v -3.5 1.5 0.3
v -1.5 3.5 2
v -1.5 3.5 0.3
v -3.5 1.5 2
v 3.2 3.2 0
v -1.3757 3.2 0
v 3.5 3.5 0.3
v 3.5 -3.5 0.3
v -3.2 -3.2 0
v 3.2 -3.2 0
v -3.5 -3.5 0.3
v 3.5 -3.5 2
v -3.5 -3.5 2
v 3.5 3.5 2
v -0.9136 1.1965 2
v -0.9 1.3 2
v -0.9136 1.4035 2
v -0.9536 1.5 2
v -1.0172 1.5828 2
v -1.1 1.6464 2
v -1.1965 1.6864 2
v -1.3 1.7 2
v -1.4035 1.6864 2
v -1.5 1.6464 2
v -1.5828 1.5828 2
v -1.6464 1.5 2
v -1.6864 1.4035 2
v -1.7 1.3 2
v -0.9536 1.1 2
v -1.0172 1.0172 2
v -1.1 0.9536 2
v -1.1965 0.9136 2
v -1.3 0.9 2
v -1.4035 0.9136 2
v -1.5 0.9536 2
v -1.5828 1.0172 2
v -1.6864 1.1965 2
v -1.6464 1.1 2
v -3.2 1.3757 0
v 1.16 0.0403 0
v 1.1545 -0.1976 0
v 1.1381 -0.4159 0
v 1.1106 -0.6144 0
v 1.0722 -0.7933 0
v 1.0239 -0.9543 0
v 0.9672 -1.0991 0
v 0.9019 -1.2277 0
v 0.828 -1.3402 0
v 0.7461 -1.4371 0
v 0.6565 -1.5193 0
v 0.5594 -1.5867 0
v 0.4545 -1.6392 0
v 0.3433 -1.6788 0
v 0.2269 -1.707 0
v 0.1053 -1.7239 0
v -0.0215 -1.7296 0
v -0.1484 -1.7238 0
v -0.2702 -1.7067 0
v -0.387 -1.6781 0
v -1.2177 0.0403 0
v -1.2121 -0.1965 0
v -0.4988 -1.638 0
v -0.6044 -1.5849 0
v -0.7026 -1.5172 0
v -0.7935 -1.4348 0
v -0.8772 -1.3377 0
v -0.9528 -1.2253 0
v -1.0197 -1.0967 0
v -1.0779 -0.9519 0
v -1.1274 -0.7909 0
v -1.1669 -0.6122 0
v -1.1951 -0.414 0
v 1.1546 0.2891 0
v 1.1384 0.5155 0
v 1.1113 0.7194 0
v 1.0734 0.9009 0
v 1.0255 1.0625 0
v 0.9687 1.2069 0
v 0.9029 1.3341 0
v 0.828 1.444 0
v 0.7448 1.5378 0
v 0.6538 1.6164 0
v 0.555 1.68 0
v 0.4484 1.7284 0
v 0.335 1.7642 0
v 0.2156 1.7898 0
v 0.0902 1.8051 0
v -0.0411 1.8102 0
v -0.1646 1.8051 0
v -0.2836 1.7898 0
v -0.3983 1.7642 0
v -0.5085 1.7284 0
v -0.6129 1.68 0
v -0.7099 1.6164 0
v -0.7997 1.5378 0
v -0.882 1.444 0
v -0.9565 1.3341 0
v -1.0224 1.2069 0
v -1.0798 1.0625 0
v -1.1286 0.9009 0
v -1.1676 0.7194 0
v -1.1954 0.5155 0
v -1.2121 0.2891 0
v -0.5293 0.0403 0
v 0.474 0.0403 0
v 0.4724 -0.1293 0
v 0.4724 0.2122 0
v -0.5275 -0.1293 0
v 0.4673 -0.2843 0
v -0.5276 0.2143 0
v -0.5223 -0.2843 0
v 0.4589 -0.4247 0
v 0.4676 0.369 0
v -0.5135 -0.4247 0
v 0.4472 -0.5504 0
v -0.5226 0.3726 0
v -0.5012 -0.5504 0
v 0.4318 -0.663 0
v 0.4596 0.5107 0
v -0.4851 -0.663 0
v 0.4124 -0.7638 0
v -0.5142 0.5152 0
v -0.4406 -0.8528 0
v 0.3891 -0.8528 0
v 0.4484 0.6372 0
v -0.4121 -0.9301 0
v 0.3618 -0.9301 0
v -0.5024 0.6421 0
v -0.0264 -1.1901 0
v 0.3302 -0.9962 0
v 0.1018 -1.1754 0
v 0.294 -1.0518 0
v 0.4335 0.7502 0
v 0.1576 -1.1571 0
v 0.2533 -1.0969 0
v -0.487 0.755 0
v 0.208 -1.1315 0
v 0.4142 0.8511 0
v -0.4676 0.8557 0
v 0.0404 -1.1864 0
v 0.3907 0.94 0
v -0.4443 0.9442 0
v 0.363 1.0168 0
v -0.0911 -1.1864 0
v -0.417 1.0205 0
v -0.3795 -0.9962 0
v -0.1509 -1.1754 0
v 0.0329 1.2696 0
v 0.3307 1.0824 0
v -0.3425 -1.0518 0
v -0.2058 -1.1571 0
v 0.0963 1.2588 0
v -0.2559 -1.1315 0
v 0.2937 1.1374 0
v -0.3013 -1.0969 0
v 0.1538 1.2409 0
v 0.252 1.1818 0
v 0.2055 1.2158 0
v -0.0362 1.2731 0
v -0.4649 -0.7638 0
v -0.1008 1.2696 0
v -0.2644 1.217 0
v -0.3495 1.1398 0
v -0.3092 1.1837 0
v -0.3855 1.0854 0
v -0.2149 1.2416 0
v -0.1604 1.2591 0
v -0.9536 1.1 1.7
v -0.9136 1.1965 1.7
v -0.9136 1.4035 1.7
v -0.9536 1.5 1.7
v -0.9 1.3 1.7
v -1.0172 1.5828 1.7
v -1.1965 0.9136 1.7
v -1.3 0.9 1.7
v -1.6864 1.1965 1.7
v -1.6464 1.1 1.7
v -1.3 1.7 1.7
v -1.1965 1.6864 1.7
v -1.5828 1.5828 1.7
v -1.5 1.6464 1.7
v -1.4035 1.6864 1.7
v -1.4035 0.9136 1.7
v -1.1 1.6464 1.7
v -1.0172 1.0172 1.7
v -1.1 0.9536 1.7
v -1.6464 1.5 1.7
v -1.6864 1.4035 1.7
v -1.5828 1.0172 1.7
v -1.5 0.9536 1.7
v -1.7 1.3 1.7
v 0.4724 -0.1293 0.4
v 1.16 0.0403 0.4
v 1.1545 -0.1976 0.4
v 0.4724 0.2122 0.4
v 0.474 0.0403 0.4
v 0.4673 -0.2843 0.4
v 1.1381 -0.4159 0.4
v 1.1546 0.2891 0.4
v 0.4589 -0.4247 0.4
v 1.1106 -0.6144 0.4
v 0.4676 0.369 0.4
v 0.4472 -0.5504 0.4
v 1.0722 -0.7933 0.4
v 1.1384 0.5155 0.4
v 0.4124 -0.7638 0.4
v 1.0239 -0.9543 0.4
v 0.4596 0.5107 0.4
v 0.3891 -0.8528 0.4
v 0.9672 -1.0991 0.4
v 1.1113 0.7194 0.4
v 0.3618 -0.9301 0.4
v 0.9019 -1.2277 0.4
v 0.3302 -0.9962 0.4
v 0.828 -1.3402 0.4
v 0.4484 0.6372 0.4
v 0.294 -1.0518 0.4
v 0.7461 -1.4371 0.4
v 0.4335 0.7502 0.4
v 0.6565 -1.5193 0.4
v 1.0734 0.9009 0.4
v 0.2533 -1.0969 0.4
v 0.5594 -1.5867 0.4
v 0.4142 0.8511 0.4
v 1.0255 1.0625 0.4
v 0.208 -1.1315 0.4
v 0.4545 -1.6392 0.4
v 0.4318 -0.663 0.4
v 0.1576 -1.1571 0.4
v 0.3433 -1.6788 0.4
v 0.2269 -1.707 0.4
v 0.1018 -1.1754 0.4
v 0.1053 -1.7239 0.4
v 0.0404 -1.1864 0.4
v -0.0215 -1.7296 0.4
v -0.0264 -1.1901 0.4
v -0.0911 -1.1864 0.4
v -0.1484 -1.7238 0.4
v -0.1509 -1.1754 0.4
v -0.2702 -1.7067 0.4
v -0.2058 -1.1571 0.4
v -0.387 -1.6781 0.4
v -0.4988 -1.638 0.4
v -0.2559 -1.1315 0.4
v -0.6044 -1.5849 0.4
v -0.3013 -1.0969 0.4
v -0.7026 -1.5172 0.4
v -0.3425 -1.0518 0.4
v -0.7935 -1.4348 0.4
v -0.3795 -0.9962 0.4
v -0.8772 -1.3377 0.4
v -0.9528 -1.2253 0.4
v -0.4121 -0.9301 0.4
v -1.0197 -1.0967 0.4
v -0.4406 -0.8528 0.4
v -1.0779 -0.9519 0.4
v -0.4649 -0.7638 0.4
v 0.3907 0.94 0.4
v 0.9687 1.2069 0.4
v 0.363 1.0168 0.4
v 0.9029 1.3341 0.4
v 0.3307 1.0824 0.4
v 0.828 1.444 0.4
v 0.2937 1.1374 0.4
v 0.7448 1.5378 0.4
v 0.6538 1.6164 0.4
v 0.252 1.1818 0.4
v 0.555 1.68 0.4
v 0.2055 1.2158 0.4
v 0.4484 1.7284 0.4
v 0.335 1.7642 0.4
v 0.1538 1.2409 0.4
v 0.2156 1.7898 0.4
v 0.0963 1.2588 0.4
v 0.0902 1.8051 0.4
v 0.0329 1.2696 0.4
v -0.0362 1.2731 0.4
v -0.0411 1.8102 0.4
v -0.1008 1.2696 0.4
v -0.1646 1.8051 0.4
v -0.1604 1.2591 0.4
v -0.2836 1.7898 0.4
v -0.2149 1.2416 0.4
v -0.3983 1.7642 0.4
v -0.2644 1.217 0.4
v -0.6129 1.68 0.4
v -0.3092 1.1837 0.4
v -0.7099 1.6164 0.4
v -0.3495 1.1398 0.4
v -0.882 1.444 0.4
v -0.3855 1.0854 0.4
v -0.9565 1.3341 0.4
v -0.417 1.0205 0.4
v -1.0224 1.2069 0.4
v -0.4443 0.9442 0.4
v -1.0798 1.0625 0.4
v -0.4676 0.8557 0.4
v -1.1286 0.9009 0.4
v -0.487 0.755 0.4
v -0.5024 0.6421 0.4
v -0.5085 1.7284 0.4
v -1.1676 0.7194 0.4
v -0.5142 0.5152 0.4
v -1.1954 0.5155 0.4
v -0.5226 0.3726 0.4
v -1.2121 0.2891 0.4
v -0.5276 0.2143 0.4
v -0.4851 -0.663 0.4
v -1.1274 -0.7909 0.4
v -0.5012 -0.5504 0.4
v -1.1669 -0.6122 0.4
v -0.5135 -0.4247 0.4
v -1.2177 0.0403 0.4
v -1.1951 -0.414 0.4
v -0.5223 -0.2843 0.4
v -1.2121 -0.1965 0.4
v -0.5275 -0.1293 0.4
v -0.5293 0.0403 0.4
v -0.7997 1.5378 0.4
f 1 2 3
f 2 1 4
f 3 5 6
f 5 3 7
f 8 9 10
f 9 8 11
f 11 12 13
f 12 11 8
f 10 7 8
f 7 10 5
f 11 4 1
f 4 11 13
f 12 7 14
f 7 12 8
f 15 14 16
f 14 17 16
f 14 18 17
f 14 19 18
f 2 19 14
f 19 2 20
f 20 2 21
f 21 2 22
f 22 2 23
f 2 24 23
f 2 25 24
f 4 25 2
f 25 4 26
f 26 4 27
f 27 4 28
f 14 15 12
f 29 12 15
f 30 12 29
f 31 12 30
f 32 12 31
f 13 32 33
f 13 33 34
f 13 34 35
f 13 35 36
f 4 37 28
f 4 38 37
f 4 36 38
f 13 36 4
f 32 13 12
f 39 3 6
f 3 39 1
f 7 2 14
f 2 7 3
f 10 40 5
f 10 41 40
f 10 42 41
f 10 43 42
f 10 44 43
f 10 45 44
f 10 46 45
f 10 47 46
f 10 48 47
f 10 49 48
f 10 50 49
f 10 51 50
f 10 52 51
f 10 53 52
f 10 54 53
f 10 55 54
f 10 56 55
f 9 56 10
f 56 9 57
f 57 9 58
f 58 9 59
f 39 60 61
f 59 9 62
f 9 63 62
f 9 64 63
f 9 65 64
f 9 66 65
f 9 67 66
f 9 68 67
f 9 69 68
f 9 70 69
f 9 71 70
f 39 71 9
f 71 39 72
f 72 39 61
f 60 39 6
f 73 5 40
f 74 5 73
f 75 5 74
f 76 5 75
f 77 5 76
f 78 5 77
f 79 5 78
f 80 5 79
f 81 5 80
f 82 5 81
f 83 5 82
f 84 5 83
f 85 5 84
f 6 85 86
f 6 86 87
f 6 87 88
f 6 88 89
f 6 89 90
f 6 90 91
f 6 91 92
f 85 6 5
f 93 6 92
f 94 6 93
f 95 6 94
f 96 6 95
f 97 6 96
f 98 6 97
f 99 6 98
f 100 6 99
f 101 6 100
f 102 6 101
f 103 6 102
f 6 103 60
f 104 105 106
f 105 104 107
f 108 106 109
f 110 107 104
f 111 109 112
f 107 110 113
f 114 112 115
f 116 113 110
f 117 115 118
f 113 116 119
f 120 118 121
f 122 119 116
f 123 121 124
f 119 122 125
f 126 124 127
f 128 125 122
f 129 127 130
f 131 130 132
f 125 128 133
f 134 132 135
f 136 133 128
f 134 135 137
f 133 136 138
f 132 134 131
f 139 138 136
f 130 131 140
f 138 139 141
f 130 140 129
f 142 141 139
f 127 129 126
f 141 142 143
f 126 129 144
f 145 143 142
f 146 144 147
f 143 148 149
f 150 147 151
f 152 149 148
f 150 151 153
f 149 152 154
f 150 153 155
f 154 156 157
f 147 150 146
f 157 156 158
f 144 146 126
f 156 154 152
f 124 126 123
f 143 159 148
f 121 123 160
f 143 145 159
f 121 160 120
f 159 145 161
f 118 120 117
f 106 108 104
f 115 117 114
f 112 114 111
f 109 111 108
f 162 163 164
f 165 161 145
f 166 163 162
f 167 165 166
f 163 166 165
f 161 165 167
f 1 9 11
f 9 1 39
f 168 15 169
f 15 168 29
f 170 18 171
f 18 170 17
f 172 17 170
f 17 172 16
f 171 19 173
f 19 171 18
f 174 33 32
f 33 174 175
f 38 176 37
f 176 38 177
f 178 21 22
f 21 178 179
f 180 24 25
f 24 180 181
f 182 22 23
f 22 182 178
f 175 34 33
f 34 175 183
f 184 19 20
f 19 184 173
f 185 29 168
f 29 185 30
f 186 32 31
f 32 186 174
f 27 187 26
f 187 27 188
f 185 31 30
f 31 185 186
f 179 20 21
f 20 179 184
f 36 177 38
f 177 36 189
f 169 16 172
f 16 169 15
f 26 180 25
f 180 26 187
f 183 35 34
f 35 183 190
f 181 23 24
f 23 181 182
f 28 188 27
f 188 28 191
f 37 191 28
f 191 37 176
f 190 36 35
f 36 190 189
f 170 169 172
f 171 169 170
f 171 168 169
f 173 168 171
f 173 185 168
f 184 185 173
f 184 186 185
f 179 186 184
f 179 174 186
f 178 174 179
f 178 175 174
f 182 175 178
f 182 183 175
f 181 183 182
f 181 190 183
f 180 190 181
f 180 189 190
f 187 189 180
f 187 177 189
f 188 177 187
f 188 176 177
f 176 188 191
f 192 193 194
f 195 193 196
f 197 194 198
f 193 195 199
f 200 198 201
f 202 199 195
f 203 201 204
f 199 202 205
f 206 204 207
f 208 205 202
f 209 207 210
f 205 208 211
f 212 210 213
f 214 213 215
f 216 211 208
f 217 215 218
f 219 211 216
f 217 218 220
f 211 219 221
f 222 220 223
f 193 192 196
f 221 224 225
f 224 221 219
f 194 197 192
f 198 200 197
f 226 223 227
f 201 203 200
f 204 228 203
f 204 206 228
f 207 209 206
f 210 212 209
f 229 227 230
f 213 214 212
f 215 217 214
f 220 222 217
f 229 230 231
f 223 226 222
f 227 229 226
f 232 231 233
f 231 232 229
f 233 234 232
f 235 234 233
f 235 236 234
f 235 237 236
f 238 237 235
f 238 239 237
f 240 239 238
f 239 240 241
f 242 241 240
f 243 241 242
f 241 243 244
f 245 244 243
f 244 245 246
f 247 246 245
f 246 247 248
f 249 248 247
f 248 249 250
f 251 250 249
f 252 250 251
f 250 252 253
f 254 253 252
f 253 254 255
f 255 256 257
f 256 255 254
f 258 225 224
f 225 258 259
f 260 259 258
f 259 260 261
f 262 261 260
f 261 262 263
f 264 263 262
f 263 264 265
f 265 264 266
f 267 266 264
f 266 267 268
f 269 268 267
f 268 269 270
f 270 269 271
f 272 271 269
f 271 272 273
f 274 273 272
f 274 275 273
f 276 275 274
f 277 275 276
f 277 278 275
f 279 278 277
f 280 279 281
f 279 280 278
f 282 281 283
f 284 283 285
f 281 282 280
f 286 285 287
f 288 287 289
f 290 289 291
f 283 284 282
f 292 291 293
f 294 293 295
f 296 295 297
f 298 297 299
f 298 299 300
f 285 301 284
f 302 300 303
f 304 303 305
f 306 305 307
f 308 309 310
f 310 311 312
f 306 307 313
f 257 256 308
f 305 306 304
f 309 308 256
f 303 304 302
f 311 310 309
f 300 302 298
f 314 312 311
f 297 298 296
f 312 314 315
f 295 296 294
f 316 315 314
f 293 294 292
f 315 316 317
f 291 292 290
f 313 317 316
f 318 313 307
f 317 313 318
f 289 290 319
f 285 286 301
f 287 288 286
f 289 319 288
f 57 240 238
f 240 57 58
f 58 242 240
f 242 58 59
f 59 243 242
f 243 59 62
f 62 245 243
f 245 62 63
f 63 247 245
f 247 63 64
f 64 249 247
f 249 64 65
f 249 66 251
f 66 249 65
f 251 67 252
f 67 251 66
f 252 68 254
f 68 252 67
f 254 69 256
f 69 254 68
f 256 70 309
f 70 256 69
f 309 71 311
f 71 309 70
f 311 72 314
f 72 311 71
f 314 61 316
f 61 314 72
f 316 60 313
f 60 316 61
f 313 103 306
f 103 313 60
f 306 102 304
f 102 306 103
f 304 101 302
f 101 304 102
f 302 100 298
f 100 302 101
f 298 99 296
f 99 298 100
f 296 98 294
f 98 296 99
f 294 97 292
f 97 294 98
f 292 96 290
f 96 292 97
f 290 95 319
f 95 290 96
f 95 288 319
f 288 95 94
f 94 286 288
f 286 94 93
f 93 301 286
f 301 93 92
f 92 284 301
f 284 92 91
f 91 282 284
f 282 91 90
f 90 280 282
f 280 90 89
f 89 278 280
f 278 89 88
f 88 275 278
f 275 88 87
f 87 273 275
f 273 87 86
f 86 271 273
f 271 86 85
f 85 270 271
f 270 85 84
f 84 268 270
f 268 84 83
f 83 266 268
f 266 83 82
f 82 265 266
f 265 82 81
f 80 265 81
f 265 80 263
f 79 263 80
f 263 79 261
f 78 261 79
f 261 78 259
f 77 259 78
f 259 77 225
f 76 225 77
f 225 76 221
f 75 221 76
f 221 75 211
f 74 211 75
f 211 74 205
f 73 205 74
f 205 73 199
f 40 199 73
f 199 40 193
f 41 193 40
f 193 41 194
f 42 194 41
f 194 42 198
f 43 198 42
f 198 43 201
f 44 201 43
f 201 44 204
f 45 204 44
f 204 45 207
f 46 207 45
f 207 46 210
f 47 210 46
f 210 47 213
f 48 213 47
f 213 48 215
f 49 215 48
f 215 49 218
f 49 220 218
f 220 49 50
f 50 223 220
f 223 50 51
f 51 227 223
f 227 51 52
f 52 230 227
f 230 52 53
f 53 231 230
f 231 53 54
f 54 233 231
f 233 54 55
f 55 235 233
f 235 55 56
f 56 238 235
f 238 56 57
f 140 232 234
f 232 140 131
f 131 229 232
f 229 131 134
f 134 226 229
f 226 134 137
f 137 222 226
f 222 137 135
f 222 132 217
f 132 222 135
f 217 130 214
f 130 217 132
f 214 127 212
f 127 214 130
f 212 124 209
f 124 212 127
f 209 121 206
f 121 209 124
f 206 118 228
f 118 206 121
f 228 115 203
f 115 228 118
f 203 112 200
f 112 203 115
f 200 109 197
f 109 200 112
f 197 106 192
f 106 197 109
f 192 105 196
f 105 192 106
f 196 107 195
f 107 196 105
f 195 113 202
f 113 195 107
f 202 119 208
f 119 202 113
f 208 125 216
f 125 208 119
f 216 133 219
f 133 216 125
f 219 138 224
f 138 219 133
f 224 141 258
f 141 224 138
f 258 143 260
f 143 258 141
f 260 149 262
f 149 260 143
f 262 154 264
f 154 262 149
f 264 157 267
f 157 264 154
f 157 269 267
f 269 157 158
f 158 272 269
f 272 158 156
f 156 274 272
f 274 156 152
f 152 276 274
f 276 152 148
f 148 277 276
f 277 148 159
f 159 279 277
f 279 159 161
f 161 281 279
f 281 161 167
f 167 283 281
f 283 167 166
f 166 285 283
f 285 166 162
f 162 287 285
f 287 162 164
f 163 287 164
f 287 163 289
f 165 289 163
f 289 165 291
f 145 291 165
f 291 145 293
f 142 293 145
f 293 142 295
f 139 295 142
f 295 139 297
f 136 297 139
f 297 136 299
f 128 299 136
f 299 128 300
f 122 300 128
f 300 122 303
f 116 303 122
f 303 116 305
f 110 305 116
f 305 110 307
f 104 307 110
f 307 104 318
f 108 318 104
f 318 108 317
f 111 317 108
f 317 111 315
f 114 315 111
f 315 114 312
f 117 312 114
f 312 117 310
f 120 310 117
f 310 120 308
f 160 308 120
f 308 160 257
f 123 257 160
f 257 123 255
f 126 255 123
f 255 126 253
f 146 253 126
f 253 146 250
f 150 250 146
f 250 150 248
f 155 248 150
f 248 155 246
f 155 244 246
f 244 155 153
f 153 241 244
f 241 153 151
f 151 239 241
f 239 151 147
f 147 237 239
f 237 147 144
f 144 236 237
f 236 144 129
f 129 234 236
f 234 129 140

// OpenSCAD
// WiFi QR puzzle board — 2x2-module tile
// Orientation: +y is "up" (toward the letter row on the board), clipped corner at top-left.
// Bit weights: TL=8, TR=4, BL=2, BR=1

id        = 0;        // 0..15, which pattern
part      = "light";  // "light" (body) or "dark" (inlay)

m         = 3.5;      // module size
tile      = 2*m;      // 7 mm
h         = 2.0;      // tile thickness
inlay     = 0.6;      // depth of dark inlay from top face
clip      = 2.0;      // clipped corner leg length
dot_d     = 0.8;      // orientation dot diameter
dot_depth = 0.3;
chamfer   = 0.3;      // bottom edge chamfer for easy seating
text_depth= 0.4;      // dark inlay on the back (first two layers)
text_size = 3.6;

$fn = 24;

module outline2d() {
    difference() {
        square(tile, center=true);
        // clip top-left corner
        translate([-tile/2, tile/2]) polygon([[0,0],[clip,0],[0,-clip]]);
    }
}

module body() {
    hull() {
        linear_extrude(0.01) offset(delta=-chamfer) outline2d();
        translate([0,0,chamfer]) linear_extrude(h-chamfer) outline2d();
    }
}

// quadrant q: 0=TL 1=TR 2=BL 3=BR
function qx(q) = (q==0||q==2) ? -m/2 : m/2;
function qy(q) = (q<2) ? m/2 : -m/2;
function bit(q) = [8,4,2,1][q];
function set(q) = floor(id / bit(q)) % 2 == 1;

module inlay_block(q, over=0) {
    translate([qx(q), qy(q), h - inlay])
        linear_extrude(inlay + over) intersection() {
            translate([qx(q)*-1, qy(q)*-1]) outline2d();   // keep clipped corner
            square(m, center=true);
        }
}

module inlays(over=0) { for (q=[0:3]) if (set(q)) inlay_block(q, over); }

module dot() {
    translate([-tile/2 + 2.2, tile/2 - 2.2, h - dot_depth])
        cylinder(d=dot_d, h=dot_depth + 0.01);
}

module back_id(over=0) {
    // dark inlay on the back, mirrored so it reads correctly when the tile is flipped over
    translate([0,0,-over]) mirror([1,0,0])
        linear_extrude(text_depth + over)
            text(str(["0","1","2","3","4","5","6","7","8","9","A","B","C","D","E","F"][id]),
                 size=text_size, halign="center", valign="center", font="Liberation Sans:style=Bold");
}

if (part == "light") {
    difference() {
        body();
        inlays(0.01);
        dot();
        back_id(0.01);
    }
} else {
    difference() {
        inlays();
        dot();
    }
    back_id();
}
